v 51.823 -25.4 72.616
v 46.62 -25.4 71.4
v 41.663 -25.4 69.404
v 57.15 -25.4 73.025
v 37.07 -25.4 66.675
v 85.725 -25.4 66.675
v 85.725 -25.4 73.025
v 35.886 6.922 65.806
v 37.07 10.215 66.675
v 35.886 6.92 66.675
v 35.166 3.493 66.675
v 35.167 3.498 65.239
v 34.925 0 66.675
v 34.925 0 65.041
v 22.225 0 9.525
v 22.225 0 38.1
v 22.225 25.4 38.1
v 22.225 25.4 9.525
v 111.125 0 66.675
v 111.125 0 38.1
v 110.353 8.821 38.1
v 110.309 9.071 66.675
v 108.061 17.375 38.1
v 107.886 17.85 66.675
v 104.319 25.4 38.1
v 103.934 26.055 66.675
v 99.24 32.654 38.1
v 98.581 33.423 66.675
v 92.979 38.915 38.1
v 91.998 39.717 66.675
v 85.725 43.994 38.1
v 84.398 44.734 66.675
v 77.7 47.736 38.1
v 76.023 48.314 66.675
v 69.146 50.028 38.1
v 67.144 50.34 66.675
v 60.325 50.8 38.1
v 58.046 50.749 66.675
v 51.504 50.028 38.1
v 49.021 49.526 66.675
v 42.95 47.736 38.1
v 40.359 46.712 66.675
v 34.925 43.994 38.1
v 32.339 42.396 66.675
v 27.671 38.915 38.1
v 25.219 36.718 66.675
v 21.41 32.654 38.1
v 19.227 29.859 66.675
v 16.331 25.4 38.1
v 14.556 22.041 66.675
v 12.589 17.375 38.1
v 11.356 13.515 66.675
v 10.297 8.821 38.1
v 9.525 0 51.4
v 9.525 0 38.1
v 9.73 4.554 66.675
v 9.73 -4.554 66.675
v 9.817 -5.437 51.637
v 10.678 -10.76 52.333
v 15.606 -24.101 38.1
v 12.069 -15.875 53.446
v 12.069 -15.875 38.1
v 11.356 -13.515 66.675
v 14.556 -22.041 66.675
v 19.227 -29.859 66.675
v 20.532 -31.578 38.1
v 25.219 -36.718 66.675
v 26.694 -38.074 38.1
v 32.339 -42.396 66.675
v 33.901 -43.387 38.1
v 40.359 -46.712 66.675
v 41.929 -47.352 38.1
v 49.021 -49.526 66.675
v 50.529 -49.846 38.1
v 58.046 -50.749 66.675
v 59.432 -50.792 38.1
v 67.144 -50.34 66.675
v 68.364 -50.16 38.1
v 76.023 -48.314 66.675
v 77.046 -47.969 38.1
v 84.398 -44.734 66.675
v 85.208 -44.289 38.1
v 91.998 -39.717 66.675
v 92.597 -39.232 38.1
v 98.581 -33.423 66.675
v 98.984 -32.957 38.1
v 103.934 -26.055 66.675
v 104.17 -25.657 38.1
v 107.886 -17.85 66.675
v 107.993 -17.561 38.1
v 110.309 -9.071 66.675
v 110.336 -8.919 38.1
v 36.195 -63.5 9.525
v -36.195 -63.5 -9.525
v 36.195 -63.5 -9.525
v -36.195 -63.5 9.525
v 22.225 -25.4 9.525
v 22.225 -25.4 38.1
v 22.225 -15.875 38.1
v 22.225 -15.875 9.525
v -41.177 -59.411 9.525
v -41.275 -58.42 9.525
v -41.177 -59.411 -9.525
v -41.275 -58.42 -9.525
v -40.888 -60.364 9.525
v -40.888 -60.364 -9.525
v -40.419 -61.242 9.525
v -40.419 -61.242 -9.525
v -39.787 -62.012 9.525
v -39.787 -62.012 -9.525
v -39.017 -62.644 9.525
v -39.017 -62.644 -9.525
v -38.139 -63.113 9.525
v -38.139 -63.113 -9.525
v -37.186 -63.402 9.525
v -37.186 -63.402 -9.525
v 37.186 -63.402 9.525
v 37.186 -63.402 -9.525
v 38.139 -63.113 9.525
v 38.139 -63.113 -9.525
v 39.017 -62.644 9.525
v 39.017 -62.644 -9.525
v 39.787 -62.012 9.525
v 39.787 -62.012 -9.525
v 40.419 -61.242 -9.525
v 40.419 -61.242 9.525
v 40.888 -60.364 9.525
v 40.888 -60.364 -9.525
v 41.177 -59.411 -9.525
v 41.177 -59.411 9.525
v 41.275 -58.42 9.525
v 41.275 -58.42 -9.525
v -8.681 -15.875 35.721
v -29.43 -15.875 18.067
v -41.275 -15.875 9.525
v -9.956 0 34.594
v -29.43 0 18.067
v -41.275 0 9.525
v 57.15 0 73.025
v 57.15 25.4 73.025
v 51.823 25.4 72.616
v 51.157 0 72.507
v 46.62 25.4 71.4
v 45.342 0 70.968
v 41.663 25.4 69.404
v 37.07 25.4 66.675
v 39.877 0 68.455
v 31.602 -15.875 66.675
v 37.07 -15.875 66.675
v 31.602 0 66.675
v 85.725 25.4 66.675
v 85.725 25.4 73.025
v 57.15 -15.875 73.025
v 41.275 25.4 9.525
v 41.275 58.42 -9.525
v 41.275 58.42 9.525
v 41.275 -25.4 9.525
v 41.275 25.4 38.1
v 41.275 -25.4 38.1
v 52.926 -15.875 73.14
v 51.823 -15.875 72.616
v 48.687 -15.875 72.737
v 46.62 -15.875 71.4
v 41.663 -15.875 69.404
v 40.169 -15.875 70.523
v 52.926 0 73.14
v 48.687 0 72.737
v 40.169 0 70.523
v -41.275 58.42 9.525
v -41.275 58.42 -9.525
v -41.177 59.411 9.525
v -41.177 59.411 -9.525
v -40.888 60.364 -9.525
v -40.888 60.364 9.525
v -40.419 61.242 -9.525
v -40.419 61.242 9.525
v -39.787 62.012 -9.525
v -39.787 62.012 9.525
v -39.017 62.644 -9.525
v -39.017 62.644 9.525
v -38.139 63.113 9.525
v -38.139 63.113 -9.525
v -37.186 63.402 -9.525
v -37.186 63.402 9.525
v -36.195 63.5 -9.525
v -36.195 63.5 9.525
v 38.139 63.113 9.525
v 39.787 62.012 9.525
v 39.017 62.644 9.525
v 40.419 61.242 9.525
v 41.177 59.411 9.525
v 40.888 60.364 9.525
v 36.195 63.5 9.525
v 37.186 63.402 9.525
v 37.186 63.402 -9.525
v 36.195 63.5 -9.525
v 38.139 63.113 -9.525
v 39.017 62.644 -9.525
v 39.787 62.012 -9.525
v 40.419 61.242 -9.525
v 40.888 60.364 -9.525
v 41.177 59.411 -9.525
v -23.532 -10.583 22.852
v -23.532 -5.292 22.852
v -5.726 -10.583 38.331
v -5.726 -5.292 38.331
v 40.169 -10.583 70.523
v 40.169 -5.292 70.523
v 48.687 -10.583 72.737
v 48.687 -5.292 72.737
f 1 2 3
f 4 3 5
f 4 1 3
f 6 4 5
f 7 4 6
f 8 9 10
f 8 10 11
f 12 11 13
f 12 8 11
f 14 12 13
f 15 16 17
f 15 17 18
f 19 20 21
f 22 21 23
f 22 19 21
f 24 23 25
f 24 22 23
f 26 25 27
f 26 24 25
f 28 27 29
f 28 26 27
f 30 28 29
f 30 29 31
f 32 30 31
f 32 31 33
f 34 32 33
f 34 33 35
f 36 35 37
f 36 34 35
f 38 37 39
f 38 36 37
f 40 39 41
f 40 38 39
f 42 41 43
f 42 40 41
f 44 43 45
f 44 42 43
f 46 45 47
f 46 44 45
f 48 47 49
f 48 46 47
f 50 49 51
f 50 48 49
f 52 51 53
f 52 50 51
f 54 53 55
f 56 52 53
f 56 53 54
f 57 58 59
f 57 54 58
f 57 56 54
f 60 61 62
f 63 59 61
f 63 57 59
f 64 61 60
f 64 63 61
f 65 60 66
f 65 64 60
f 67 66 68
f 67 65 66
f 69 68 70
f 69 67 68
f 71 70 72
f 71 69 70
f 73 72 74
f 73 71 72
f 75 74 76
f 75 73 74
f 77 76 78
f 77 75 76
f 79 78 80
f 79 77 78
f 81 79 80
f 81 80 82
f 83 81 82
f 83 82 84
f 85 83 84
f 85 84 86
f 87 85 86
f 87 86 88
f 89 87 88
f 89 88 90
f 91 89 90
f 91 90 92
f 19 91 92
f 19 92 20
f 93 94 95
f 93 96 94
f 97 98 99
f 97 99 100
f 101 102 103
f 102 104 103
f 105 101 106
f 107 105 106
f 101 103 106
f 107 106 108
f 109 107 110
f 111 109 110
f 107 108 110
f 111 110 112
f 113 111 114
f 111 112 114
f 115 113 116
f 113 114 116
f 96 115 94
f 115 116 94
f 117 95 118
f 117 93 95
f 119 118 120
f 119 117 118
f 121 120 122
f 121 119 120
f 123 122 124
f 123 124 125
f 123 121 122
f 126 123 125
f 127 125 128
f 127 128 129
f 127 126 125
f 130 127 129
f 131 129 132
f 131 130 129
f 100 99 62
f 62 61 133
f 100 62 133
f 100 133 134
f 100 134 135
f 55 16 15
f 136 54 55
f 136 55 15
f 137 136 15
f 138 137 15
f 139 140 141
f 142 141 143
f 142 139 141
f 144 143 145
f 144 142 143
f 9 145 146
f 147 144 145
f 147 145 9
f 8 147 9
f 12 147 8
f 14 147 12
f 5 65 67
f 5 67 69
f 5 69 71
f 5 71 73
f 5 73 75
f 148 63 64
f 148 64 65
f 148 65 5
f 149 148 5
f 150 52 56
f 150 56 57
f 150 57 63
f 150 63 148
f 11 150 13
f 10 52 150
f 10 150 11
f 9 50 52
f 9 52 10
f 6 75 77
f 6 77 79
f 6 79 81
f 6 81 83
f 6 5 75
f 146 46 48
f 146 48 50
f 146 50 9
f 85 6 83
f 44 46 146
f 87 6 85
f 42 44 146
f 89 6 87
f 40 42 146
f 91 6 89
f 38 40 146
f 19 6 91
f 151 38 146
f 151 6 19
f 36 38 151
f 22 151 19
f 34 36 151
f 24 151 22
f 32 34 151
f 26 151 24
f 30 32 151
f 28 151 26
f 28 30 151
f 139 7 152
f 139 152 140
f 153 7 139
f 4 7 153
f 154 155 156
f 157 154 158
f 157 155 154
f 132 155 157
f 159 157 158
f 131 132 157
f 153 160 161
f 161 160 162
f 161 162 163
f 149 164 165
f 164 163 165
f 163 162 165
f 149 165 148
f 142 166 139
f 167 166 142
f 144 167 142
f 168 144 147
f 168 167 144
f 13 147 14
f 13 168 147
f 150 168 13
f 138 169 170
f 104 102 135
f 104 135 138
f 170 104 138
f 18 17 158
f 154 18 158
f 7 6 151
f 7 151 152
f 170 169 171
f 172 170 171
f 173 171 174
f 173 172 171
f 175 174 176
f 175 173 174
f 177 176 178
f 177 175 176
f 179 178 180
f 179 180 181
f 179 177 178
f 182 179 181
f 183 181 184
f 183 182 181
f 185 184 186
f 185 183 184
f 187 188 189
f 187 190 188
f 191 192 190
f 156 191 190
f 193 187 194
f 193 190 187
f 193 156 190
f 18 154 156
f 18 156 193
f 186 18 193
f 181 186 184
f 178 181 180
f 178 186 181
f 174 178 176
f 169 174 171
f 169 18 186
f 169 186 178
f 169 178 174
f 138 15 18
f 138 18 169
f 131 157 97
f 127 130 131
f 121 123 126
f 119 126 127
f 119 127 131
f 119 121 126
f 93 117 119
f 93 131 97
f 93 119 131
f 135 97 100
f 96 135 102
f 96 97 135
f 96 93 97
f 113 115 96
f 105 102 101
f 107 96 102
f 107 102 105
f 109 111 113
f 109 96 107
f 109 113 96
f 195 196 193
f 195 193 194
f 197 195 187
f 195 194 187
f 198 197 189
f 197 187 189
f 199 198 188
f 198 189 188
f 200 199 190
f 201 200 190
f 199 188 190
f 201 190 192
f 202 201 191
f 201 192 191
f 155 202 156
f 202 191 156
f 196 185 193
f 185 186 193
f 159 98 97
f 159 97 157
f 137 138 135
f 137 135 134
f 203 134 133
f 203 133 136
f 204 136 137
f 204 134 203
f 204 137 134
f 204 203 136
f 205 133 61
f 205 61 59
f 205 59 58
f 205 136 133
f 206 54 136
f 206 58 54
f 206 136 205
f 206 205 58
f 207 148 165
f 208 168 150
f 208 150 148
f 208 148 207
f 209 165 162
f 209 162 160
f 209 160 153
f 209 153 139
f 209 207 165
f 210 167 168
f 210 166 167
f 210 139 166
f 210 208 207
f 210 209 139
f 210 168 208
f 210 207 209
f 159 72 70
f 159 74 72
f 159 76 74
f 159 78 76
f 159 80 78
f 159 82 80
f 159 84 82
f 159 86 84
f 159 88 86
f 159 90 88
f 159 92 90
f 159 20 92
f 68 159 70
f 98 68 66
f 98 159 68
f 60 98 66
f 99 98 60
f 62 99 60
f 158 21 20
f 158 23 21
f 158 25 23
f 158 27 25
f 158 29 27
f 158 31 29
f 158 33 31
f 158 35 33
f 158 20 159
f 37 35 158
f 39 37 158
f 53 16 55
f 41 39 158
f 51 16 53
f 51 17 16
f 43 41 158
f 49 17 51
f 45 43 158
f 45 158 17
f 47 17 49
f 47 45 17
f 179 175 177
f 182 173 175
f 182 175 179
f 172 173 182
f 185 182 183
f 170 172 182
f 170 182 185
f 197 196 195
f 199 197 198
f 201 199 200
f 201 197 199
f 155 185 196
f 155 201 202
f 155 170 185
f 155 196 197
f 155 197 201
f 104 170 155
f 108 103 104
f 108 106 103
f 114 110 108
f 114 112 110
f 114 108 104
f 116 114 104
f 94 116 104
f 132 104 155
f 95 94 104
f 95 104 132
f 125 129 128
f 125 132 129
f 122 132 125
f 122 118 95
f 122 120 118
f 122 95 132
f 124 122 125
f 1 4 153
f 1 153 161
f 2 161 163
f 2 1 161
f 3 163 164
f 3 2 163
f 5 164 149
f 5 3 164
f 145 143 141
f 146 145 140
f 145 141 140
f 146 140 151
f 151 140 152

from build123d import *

# Parameters (mm, degrees)
F1_DEPTH = 63.5
F0_W     = 25.4
F0_H     = 12.7
F2_DEPTH = 25.4
F3_DEPTH = 15.875
F5_R     = 5.08


with BuildPart() as f1:
    # F0 (on Front) → F1 (new body, symmetric)
    with BuildSketch(Plane.XZ):
        Polygon((-41.275, -9.525), (41.275, -9.525), (41.275, 9.525), (22.225, 9.525), (-41.275, 9.525), align=None)
    extrude(amount=F1_DEPTH, both=True)

    # F0 (on Front) → F2 (join, symmetric)
    with BuildSketch(Plane.XZ):
        with BuildLine():
            Line((22.225, 9.525), (41.275, 9.525))
            Line((41.275, 9.525), (41.275, 38.1))
            ThreePointArc((41.275, 38.1), (45.92468, 49.32532), (57.15, 53.975))
            Line((57.15, 53.975), (60.325, 53.975))
            Line((60.325, 53.975), (60.325, 66.675))
            Line((60.325, 66.675), (85.725, 66.675))
            Line((85.725, 66.675), (85.725, 73.025))
            Line((85.725, 73.025), (57.15, 73.025))
            ThreePointArc((57.15, 73.025), (32.454296, 62.795704), (22.225, 38.1))
            Line((22.225, 38.1), (22.225, 9.525))
        make_face()
        with Locations((73.025, 60.325)):
            Rectangle(F0_W, F0_H)
    extrude(amount=F2_DEPTH, both=True)

    # F0 (on Front) → F3 (join)
    with BuildSketch(Plane.XZ):
        with BuildLine():
            add(Edge.make_bspline(
                [(-41.275, 9.525), (-8.466667, 30.691667), (25.044836, 75.964727), (57.15, 73.025)],
                knots=[0, 0, 0, 0, 117.131254, 117.131254, 117.131254, 117.131254], degree=3))
            Line((-41.275, 9.525), (22.225, 9.525))
            Line((22.225, 9.525), (22.225, 38.1))
            ThreePointArc((22.225, 38.1), (32.454296, 62.795704), (57.15, 73.025))
        make_face()
    extrude(amount=F3_DEPTH)

    # F0 (on Front) → F4 (revolve)
    with BuildSketch(Plane.XZ):
        Polygon((85.725, 53.975), (60.325, 53.975), (60.325, 38.1), (111.125, 38.1), (111.125, 66.675), (85.725, 66.675), align=None)
    revolve(axis=Axis((60.325, 0, 52.3875), (0, 0, 1)))

    # F5
    f5_edges = [f1.edges().sort_by_distance(p)[0] for p in [
        (41.275, -63.5, 0),
        (-41.275, -63.5, 0),
        (41.275, 63.5, 0),
        (-41.275, 63.5, 0),
    ]]
    fillet(f5_edges, radius=F5_R)


solid = f1.part
